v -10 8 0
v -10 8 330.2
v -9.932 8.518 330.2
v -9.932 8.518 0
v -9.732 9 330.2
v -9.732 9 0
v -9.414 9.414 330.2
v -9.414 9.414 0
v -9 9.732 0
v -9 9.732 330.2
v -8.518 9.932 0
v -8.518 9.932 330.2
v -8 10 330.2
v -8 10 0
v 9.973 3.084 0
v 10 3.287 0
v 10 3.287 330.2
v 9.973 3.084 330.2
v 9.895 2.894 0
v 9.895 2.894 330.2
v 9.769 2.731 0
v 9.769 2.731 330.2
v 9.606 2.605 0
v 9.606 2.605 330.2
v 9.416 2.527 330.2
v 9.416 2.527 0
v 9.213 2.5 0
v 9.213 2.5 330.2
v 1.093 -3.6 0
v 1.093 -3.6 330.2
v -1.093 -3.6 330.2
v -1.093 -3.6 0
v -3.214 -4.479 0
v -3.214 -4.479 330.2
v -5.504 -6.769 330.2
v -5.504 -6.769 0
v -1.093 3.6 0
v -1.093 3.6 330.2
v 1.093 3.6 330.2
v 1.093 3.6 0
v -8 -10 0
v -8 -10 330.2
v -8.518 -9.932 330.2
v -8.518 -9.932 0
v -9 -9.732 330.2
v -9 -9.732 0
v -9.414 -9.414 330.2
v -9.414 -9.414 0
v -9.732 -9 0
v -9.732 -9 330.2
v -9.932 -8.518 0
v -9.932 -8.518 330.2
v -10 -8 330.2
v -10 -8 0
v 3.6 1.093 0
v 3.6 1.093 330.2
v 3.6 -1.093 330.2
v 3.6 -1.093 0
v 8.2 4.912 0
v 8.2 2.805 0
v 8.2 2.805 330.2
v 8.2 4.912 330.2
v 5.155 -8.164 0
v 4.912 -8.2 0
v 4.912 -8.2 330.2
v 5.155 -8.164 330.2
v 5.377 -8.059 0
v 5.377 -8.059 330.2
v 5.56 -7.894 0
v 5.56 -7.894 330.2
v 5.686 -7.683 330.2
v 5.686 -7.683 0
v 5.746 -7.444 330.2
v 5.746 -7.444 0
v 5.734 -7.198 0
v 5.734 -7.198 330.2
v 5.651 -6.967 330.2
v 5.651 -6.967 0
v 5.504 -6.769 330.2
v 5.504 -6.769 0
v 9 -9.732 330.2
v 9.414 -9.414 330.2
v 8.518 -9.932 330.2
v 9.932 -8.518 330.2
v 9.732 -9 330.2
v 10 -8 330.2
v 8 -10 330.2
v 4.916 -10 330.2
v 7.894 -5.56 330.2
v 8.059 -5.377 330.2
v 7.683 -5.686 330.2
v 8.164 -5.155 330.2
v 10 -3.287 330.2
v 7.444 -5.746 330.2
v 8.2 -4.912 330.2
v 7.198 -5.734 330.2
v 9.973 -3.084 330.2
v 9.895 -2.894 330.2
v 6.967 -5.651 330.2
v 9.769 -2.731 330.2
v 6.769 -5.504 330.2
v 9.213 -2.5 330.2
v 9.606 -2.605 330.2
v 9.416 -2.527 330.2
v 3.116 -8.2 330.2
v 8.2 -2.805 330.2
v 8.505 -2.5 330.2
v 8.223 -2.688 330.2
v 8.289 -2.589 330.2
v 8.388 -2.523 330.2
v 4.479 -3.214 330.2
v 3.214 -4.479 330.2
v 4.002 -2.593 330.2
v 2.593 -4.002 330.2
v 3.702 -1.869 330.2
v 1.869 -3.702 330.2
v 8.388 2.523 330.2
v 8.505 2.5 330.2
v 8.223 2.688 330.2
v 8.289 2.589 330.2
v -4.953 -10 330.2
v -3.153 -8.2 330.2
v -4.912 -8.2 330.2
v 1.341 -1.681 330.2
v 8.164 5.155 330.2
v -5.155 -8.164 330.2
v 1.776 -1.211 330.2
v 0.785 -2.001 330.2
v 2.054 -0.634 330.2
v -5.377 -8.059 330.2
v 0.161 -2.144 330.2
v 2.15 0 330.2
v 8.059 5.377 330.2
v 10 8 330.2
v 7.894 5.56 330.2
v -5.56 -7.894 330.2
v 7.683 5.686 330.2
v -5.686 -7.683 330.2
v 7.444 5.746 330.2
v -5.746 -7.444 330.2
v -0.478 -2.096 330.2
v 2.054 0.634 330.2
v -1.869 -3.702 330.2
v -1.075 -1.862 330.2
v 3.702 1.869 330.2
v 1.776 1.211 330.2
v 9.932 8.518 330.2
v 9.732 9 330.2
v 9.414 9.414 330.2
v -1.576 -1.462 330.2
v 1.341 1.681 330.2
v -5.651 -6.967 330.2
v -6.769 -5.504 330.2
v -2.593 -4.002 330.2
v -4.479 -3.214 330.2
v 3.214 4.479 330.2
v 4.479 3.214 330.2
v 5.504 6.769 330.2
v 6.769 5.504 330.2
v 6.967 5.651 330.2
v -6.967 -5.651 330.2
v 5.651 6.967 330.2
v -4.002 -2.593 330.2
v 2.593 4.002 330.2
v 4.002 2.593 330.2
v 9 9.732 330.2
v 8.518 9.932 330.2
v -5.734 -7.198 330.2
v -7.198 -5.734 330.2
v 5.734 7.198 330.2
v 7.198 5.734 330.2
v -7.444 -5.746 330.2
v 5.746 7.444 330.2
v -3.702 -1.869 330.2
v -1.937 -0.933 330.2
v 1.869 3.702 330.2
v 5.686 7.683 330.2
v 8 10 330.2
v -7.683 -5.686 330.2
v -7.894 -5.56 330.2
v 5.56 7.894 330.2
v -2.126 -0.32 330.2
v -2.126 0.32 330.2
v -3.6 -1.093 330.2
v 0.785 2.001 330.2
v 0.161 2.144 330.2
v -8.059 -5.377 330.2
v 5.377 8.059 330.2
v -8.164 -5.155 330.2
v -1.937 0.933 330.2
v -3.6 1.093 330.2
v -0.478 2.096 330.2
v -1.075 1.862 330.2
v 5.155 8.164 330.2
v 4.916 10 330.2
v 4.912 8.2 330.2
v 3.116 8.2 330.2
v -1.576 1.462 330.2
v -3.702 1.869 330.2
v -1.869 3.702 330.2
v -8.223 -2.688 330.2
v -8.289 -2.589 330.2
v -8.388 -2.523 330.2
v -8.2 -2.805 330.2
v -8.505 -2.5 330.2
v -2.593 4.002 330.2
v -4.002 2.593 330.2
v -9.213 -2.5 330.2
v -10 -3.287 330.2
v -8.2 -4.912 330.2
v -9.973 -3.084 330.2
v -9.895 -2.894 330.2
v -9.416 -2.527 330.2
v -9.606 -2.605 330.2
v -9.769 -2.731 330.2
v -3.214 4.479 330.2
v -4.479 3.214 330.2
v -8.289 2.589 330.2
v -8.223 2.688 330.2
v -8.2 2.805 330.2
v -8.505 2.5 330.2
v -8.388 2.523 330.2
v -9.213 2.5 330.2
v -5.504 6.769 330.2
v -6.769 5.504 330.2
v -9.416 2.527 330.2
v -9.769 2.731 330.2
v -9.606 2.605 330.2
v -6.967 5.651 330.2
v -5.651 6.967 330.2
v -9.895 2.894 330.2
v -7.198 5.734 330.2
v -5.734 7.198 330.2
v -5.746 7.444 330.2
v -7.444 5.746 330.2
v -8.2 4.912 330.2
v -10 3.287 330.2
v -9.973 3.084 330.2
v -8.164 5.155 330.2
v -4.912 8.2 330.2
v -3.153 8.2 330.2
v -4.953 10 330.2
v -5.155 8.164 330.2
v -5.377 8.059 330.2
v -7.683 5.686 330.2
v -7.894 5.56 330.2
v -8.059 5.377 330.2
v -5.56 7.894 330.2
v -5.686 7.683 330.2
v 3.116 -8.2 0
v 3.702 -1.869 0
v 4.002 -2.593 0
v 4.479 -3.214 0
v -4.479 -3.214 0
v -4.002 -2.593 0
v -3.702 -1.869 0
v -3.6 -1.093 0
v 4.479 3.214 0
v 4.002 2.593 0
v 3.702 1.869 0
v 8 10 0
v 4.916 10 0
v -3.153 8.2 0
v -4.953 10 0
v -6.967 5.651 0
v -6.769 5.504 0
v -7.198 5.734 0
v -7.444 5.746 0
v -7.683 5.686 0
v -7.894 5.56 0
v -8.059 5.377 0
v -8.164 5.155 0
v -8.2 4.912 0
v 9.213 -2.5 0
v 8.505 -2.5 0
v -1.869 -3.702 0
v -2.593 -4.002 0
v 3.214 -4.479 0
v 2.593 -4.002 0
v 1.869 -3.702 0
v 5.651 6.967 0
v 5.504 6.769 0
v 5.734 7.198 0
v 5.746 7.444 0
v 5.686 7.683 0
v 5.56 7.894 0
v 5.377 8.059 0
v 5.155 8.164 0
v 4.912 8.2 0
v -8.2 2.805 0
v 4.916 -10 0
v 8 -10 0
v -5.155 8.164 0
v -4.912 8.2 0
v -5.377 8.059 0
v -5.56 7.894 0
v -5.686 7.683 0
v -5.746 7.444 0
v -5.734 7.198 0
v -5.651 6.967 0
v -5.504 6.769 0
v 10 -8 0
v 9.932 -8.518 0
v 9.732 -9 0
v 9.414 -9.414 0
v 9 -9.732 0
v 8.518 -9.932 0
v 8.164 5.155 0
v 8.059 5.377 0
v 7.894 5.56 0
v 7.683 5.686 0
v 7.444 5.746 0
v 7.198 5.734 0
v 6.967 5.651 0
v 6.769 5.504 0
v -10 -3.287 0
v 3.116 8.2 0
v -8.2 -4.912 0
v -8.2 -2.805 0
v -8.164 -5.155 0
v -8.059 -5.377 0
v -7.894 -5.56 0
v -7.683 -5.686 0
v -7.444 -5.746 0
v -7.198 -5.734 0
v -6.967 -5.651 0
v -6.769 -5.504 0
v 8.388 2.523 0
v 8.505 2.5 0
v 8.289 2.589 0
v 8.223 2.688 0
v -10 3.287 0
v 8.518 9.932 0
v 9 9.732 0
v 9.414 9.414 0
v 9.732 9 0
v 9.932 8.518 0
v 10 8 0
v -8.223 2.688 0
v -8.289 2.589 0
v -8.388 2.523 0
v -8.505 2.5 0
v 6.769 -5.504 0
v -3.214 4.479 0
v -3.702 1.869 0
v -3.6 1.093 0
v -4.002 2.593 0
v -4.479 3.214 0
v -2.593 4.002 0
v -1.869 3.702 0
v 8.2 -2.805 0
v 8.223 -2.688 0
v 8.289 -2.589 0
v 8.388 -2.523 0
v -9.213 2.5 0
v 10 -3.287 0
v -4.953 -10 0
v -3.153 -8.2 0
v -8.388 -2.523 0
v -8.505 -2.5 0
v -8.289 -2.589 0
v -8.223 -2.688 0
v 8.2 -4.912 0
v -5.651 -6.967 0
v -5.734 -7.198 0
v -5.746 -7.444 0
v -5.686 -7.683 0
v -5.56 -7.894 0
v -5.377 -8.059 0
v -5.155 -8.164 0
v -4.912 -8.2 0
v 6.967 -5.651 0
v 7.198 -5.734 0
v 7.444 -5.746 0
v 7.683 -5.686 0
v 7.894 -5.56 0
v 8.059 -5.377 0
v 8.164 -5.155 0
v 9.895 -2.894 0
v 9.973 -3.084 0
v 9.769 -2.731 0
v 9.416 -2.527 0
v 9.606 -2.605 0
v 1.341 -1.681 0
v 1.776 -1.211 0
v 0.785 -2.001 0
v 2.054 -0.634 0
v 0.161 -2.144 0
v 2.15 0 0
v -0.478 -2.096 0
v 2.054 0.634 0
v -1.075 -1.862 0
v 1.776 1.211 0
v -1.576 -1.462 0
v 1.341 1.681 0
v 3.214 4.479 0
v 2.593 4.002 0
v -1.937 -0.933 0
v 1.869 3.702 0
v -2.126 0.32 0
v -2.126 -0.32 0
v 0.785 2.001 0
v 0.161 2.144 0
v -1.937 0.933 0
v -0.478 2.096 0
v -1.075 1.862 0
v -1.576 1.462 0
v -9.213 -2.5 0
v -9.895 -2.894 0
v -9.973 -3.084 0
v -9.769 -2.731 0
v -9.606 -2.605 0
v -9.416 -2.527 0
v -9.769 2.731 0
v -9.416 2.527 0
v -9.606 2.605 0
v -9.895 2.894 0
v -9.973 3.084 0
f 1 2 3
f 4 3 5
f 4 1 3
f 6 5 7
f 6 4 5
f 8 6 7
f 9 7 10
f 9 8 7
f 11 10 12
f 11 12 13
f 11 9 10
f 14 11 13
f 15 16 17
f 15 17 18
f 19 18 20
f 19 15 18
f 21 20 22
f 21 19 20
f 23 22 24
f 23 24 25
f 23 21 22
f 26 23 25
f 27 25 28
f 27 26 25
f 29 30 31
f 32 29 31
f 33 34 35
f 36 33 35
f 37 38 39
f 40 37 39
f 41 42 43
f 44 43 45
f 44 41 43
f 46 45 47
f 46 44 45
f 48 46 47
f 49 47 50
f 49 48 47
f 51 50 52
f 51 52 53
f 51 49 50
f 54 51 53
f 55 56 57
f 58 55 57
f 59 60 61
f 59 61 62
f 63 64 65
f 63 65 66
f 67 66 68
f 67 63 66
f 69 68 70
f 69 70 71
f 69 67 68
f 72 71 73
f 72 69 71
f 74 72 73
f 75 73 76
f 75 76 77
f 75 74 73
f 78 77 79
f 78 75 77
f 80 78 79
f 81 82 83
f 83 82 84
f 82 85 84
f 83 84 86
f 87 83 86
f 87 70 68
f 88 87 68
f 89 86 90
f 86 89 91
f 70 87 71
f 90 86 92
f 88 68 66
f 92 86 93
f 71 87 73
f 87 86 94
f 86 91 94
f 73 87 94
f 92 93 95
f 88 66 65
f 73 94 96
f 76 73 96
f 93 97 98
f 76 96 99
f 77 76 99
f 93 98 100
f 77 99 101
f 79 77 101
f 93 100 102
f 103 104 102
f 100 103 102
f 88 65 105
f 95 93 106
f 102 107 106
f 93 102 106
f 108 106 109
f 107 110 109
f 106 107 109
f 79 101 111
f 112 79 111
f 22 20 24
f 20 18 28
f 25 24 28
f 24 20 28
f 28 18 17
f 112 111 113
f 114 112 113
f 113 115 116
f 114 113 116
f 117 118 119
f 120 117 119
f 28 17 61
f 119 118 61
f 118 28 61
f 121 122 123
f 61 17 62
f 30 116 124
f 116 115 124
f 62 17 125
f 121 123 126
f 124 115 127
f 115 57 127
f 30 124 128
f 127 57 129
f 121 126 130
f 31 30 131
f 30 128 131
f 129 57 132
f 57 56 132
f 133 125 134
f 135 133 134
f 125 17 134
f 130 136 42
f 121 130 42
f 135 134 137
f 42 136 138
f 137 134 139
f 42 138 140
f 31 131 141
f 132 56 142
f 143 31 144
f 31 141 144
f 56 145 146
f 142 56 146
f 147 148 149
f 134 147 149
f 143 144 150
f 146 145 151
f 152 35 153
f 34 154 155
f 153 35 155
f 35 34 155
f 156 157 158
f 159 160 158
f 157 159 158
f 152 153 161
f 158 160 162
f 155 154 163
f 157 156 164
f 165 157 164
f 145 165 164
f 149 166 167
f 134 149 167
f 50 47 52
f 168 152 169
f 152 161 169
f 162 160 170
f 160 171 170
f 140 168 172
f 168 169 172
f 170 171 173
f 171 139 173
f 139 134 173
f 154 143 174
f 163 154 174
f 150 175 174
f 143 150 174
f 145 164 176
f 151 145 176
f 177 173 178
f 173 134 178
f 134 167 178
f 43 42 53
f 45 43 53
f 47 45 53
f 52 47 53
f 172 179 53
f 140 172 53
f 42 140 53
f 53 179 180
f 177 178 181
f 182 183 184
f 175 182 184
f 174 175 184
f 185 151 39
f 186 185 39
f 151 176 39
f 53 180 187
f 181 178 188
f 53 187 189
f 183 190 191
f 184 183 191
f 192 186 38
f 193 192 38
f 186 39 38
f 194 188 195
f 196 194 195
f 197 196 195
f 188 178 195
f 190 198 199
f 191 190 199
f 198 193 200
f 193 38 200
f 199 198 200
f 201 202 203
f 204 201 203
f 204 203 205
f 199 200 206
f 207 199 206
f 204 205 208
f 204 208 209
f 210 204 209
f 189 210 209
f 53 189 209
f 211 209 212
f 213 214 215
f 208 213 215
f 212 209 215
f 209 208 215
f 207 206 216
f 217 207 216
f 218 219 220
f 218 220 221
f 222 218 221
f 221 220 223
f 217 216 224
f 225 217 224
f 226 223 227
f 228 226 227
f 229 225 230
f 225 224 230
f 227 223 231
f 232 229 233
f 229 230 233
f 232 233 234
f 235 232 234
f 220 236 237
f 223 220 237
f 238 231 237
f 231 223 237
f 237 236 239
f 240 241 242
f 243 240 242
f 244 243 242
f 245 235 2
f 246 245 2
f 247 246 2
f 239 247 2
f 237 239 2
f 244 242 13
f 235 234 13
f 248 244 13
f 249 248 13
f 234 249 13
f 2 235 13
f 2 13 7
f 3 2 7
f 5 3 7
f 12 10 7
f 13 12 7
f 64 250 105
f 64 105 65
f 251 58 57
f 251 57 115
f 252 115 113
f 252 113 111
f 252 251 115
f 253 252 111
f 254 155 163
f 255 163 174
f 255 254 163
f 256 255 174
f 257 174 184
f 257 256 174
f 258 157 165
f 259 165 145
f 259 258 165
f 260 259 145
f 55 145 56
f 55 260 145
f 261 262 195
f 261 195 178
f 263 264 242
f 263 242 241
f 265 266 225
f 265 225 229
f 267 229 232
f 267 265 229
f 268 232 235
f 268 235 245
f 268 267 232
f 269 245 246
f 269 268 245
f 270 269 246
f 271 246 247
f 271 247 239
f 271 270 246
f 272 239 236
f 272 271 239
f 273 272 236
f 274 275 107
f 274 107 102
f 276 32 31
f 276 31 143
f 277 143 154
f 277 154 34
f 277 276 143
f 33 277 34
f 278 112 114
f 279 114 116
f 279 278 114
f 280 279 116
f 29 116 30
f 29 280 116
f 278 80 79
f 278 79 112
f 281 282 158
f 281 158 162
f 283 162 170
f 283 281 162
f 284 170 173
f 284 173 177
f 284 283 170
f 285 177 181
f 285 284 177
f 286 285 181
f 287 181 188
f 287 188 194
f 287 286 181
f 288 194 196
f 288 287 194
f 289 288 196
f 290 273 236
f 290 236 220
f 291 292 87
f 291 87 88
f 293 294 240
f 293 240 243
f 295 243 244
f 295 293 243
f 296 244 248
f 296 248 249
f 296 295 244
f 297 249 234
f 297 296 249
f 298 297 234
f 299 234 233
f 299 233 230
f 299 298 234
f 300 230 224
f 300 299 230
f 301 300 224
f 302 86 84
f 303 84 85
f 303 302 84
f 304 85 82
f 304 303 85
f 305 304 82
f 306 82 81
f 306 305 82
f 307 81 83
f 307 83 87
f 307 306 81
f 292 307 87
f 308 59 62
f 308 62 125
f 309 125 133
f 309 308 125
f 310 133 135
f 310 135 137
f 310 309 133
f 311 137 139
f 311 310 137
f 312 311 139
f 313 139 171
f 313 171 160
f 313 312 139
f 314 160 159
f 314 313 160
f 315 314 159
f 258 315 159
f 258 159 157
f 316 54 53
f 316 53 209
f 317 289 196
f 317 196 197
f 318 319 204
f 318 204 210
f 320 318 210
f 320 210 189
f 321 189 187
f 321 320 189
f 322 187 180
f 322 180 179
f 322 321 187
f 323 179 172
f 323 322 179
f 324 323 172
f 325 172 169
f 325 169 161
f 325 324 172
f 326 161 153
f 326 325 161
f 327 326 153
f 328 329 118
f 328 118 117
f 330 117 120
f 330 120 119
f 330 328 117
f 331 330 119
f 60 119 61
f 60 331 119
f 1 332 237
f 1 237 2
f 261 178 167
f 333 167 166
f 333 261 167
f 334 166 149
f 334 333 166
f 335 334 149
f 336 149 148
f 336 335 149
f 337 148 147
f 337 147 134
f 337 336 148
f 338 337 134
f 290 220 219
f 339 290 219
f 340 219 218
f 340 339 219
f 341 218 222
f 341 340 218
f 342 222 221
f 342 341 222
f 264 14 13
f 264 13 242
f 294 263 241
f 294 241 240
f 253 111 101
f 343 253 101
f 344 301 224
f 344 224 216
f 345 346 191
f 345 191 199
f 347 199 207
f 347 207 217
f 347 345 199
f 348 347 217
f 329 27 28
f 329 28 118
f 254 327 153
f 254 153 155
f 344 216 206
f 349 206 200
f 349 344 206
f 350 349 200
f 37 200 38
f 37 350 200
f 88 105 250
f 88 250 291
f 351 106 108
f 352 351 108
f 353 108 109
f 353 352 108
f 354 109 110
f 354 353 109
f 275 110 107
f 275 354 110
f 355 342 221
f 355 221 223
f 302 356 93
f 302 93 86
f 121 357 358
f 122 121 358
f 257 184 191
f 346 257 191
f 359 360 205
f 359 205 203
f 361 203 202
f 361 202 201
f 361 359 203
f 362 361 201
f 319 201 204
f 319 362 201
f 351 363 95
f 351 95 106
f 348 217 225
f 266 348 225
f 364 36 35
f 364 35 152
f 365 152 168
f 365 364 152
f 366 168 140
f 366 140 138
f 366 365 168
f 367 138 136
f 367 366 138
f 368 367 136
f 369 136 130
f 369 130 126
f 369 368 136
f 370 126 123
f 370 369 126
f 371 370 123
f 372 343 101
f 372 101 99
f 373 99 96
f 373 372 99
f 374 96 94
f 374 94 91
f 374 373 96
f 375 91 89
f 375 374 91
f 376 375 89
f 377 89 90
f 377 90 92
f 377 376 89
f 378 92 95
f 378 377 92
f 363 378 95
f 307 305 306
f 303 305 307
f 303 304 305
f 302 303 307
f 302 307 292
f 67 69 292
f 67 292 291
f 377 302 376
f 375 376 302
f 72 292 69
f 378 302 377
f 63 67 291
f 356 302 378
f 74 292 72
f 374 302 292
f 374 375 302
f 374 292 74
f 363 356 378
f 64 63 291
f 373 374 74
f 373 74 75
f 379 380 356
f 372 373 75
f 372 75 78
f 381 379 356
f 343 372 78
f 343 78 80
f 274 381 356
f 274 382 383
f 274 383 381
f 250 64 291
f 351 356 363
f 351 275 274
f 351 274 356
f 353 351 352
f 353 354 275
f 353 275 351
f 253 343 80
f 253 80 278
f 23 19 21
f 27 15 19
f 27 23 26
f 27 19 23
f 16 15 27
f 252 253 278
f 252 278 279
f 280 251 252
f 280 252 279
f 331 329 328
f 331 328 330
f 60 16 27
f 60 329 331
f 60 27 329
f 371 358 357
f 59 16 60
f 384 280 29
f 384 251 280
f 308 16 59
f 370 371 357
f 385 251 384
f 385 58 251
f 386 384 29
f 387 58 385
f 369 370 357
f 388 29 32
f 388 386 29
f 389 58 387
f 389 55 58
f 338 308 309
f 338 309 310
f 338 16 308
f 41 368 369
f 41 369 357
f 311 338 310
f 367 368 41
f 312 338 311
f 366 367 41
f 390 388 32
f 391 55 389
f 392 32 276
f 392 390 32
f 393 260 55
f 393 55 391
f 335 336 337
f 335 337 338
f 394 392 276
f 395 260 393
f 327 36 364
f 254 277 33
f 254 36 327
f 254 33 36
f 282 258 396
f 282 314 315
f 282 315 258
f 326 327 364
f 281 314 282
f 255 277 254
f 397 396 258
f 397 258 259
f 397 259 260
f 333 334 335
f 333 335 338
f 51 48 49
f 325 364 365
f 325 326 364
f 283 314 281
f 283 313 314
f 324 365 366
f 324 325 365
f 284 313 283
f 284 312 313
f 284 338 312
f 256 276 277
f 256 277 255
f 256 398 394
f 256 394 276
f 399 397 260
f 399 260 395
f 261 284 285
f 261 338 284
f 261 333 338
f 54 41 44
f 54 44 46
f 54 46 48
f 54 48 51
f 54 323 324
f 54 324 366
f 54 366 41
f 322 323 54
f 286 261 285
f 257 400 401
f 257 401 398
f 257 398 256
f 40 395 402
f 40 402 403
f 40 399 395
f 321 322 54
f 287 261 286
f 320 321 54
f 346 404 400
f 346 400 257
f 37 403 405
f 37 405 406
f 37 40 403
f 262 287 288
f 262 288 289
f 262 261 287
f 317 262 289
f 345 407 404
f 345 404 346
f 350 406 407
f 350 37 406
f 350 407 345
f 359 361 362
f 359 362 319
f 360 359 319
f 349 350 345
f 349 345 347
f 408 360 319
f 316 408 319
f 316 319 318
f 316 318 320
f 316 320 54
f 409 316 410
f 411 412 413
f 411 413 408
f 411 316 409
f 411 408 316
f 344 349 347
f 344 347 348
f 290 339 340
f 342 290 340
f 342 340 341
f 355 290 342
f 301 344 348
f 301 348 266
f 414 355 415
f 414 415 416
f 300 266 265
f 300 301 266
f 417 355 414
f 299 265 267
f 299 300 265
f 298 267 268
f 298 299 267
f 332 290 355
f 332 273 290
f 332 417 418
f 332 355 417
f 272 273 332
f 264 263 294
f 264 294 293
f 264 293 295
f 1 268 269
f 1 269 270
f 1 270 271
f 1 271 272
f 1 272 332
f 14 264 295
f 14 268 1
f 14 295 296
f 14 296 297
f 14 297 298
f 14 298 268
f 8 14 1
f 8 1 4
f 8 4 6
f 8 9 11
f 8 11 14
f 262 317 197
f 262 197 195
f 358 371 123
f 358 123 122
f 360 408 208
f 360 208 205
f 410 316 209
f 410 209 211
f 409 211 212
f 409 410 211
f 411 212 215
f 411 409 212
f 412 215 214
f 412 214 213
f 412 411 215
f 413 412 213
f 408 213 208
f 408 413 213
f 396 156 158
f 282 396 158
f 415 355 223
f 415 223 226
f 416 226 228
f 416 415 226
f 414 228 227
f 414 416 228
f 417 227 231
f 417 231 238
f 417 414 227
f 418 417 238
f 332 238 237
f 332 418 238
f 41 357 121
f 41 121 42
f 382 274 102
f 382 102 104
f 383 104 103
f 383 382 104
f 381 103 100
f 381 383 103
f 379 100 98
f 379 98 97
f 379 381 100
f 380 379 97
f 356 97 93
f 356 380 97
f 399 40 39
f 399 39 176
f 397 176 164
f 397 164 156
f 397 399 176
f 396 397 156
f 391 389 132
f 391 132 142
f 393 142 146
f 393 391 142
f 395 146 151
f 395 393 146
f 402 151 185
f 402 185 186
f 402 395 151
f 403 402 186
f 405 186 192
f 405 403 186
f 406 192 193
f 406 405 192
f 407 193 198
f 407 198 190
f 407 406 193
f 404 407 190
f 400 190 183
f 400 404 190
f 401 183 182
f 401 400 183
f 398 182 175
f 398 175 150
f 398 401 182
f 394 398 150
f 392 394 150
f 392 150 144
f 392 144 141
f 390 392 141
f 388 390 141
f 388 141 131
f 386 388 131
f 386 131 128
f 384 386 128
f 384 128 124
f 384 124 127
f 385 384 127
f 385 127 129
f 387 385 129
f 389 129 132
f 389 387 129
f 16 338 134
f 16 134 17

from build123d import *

# Parameters (mm, degrees)
SKETCH3_R           = 2.15
BOSS_EXTRUDE1_DEPTH = 330.2
CUT_EXTRUDE1_DEPTH  = 331.2


with BuildPart() as part:
    # Sketch3 → Boss-Extrude1 (new body)
    with BuildSketch(Plane.XY):
        with BuildLine():
            Line((3.2874, 10), (8, 10))
            ThreePointArc((8, 10), (9.414213562, 9.414213562), (10, 8))
            Line((10, 8), (10, 3.2874))
            ThreePointArc((10, 3.2874), (9.76937588, 2.73062412), (9.2126, 2.5))
            Line((9.2126, 2.5), (8.5048, 2.5))
            ThreePointArc((8.5048, 2.5), (8.289273853, 2.589273853), (8.2, 2.8048))
            Line((8.2, 2.8048), (8.2, 4.9118))
            ThreePointArc((8.2, 4.9118), (7.682565253, 5.686195824), (6.769103096, 5.504496904))
            Line((6.769103096, 5.504496904), (4.478679656, 3.214073464))
            ThreePointArc((4.478679656, 3.214073464), (3.828361402, 2.240803418), (3.6, 1.092753121))
            Line((3.6, 1.092753121), (3.6, -1.092753121))
            ThreePointArc((3.6, -1.092753121), (3.828361402, -2.240803418), (4.478679656, -3.214073464))
            Line((4.478679656, -3.214073464), (6.769103096, -5.504496904))
            ThreePointArc((6.769103096, -5.504496904), (7.682565253, -5.686195824), (8.2, -4.9118))
            Line((8.2, -4.9118), (8.2, -2.8048))
            ThreePointArc((8.2, -2.8048), (8.289273853, -2.589273853), (8.5048, -2.5))
            Line((8.5048, -2.5), (9.2126, -2.5))
            ThreePointArc((9.2126, -2.5), (9.76937588, -2.73062412), (10, -3.2874))
            Line((10, -3.2874), (10, -8))
            ThreePointArc((10, -8), (9.414213562, -9.414213562), (8, -10))
            Line((8, -10), (3.2874, -10))
            ThreePointArc((3.2874, -10), (2.73062412, -9.76937588), (2.5, -9.2126))
            Line((2.5, -9.2126), (2.5, -8.5048))
            ThreePointArc((2.5, -8.5048), (2.589273853, -8.289273853), (2.8048, -8.2))
            Line((2.8048, -8.2), (4.9118, -8.2))
            ThreePointArc((4.9118, -8.2), (5.686195824, -7.682565253), (5.504496904, -6.769103096))
            Line((5.504496904, -6.769103096), (3.214073464, -4.478679656))
            ThreePointArc((3.214073464, -4.478679656), (2.240803418, -3.828361402), (1.092753121, -3.6))
            Line((1.092753121, -3.6), (-1.092753121, -3.6))
            ThreePointArc((-1.092753121, -3.6), (-2.240803418, -3.828361402), (-3.214073464, -4.478679656))
            Line((-3.214073464, -4.478679656), (-5.504496904, -6.769103096))
            ThreePointArc((-5.504496904, -6.769103096), (-5.686195824, -7.682565253), (-4.9118, -8.2))
            Line((-4.9118, -8.2), (-2.8048, -8.2))
            ThreePointArc((-2.8048, -8.2), (-2.589273853, -8.289273853), (-2.5, -8.5048))
            Line((-2.5, -8.5048), (-2.5, -9.2126))
            ThreePointArc((-2.5, -9.2126), (-2.73062412, -9.76937588), (-3.2874, -10))
            Line((-3.2874, -10), (-8, -10))
            ThreePointArc((-8, -10), (-9.414213562, -9.414213562), (-10, -8))
            Line((-10, -8), (-10, -3.2874))
            ThreePointArc((-10, -3.2874), (-9.76937588, -2.73062412), (-9.2126, -2.5))
            Line((-9.2126, -2.5), (-8.5048, -2.5))
            ThreePointArc((-8.5048, -2.5), (-8.289273853, -2.589273853), (-8.2, -2.8048))
            Line((-8.2, -2.8048), (-8.2, -4.9118))
            ThreePointArc((-8.2, -4.9118), (-7.682565253, -5.686195824), (-6.769103096, -5.504496904))
            Line((-6.769103096, -5.504496904), (-4.478679656, -3.214073464))
            ThreePointArc((-4.478679656, -3.214073464), (-3.828361402, -2.240803418), (-3.6, -1.092753121))
            Line((-3.6, -1.092753121), (-3.6, 1.092753121))
            ThreePointArc((-3.6, 1.092753121), (-3.828361402, 2.240803418), (-4.478679656, 3.214073464))
            Line((-4.478679656, 3.214073464), (-6.769103096, 5.504496904))
            ThreePointArc((-6.769103096, 5.504496904), (-7.682565253, 5.686195824), (-8.2, 4.9118))
            Line((-8.2, 4.9118), (-8.2, 2.8048))
            ThreePointArc((-8.2, 2.8048), (-8.289273853, 2.589273853), (-8.5048, 2.5))
            Line((-8.5048, 2.5), (-9.2126, 2.5))
            ThreePointArc((-9.2126, 2.5), (-9.76937588, 2.73062412), (-10, 3.2874))
            Line((-10, 3.2874), (-10, 8))
            ThreePointArc((-10, 8), (-9.414213562, 9.414213562), (-8, 10))
            Line((-8, 10), (-3.2874, 10))
            ThreePointArc((-3.2874, 10), (-2.73062412, 9.76937588), (-2.5, 9.2126))
            Line((-2.5, 9.2126), (-2.5, 8.5048))
            ThreePointArc((-2.5, 8.5048), (-2.589273853, 8.289273853), (-2.8048, 8.2))
            Line((-2.8048, 8.2), (-4.9118, 8.2))
            ThreePointArc((-4.9118, 8.2), (-5.686195824, 7.682565253), (-5.504496904, 6.769103096))
            Line((-5.504496904, 6.769103096), (-3.214073464, 4.478679656))
            ThreePointArc((-3.214073464, 4.478679656), (-2.240803418, 3.828361402), (-1.092753121, 3.6))
            Line((-1.092753121, 3.6), (1.092753121, 3.6))
            ThreePointArc((1.092753121, 3.6), (2.240803418, 3.828361402), (3.214073464, 4.478679656))
            Line((3.214073464, 4.478679656), (5.504496904, 6.769103096))
            ThreePointArc((5.504496904, 6.769103096), (5.686195824, 7.682565253), (4.9118, 8.2))
            Line((4.9118, 8.2), (2.8048, 8.2))
            ThreePointArc((2.8048, 8.2), (2.589273853, 8.289273853), (2.5, 8.5048))
            Line((2.5, 8.5048), (2.5, 9.2126))
            ThreePointArc((2.5, 9.2126), (2.73062412, 9.76937588), (3.2874, 10))
        make_face()
        Circle(SKETCH3_R, mode=Mode.SUBTRACT)
    extrude(amount=BOSS_EXTRUDE1_DEPTH)

    # Sketch4 → Cut-Extrude1 (cut, through all)
    with BuildSketch(Plane.XY.offset(330.2)):
        Polygon((-6.018693607, 11.065698556), (-2.018693607, 7.065698556), (1.981306393, 7.065698556), (5.981306393, 11.065698556), align=None)
        Polygon((1.981306393, -7.065698556), (5.981306393, -11.065698556), (-6.018693607, -11.065698556), (-2.018693607, -7.065698556), align=None)
    extrude(amount=-CUT_EXTRUDE1_DEPTH, mode=Mode.SUBTRACT)


solid = part.part
